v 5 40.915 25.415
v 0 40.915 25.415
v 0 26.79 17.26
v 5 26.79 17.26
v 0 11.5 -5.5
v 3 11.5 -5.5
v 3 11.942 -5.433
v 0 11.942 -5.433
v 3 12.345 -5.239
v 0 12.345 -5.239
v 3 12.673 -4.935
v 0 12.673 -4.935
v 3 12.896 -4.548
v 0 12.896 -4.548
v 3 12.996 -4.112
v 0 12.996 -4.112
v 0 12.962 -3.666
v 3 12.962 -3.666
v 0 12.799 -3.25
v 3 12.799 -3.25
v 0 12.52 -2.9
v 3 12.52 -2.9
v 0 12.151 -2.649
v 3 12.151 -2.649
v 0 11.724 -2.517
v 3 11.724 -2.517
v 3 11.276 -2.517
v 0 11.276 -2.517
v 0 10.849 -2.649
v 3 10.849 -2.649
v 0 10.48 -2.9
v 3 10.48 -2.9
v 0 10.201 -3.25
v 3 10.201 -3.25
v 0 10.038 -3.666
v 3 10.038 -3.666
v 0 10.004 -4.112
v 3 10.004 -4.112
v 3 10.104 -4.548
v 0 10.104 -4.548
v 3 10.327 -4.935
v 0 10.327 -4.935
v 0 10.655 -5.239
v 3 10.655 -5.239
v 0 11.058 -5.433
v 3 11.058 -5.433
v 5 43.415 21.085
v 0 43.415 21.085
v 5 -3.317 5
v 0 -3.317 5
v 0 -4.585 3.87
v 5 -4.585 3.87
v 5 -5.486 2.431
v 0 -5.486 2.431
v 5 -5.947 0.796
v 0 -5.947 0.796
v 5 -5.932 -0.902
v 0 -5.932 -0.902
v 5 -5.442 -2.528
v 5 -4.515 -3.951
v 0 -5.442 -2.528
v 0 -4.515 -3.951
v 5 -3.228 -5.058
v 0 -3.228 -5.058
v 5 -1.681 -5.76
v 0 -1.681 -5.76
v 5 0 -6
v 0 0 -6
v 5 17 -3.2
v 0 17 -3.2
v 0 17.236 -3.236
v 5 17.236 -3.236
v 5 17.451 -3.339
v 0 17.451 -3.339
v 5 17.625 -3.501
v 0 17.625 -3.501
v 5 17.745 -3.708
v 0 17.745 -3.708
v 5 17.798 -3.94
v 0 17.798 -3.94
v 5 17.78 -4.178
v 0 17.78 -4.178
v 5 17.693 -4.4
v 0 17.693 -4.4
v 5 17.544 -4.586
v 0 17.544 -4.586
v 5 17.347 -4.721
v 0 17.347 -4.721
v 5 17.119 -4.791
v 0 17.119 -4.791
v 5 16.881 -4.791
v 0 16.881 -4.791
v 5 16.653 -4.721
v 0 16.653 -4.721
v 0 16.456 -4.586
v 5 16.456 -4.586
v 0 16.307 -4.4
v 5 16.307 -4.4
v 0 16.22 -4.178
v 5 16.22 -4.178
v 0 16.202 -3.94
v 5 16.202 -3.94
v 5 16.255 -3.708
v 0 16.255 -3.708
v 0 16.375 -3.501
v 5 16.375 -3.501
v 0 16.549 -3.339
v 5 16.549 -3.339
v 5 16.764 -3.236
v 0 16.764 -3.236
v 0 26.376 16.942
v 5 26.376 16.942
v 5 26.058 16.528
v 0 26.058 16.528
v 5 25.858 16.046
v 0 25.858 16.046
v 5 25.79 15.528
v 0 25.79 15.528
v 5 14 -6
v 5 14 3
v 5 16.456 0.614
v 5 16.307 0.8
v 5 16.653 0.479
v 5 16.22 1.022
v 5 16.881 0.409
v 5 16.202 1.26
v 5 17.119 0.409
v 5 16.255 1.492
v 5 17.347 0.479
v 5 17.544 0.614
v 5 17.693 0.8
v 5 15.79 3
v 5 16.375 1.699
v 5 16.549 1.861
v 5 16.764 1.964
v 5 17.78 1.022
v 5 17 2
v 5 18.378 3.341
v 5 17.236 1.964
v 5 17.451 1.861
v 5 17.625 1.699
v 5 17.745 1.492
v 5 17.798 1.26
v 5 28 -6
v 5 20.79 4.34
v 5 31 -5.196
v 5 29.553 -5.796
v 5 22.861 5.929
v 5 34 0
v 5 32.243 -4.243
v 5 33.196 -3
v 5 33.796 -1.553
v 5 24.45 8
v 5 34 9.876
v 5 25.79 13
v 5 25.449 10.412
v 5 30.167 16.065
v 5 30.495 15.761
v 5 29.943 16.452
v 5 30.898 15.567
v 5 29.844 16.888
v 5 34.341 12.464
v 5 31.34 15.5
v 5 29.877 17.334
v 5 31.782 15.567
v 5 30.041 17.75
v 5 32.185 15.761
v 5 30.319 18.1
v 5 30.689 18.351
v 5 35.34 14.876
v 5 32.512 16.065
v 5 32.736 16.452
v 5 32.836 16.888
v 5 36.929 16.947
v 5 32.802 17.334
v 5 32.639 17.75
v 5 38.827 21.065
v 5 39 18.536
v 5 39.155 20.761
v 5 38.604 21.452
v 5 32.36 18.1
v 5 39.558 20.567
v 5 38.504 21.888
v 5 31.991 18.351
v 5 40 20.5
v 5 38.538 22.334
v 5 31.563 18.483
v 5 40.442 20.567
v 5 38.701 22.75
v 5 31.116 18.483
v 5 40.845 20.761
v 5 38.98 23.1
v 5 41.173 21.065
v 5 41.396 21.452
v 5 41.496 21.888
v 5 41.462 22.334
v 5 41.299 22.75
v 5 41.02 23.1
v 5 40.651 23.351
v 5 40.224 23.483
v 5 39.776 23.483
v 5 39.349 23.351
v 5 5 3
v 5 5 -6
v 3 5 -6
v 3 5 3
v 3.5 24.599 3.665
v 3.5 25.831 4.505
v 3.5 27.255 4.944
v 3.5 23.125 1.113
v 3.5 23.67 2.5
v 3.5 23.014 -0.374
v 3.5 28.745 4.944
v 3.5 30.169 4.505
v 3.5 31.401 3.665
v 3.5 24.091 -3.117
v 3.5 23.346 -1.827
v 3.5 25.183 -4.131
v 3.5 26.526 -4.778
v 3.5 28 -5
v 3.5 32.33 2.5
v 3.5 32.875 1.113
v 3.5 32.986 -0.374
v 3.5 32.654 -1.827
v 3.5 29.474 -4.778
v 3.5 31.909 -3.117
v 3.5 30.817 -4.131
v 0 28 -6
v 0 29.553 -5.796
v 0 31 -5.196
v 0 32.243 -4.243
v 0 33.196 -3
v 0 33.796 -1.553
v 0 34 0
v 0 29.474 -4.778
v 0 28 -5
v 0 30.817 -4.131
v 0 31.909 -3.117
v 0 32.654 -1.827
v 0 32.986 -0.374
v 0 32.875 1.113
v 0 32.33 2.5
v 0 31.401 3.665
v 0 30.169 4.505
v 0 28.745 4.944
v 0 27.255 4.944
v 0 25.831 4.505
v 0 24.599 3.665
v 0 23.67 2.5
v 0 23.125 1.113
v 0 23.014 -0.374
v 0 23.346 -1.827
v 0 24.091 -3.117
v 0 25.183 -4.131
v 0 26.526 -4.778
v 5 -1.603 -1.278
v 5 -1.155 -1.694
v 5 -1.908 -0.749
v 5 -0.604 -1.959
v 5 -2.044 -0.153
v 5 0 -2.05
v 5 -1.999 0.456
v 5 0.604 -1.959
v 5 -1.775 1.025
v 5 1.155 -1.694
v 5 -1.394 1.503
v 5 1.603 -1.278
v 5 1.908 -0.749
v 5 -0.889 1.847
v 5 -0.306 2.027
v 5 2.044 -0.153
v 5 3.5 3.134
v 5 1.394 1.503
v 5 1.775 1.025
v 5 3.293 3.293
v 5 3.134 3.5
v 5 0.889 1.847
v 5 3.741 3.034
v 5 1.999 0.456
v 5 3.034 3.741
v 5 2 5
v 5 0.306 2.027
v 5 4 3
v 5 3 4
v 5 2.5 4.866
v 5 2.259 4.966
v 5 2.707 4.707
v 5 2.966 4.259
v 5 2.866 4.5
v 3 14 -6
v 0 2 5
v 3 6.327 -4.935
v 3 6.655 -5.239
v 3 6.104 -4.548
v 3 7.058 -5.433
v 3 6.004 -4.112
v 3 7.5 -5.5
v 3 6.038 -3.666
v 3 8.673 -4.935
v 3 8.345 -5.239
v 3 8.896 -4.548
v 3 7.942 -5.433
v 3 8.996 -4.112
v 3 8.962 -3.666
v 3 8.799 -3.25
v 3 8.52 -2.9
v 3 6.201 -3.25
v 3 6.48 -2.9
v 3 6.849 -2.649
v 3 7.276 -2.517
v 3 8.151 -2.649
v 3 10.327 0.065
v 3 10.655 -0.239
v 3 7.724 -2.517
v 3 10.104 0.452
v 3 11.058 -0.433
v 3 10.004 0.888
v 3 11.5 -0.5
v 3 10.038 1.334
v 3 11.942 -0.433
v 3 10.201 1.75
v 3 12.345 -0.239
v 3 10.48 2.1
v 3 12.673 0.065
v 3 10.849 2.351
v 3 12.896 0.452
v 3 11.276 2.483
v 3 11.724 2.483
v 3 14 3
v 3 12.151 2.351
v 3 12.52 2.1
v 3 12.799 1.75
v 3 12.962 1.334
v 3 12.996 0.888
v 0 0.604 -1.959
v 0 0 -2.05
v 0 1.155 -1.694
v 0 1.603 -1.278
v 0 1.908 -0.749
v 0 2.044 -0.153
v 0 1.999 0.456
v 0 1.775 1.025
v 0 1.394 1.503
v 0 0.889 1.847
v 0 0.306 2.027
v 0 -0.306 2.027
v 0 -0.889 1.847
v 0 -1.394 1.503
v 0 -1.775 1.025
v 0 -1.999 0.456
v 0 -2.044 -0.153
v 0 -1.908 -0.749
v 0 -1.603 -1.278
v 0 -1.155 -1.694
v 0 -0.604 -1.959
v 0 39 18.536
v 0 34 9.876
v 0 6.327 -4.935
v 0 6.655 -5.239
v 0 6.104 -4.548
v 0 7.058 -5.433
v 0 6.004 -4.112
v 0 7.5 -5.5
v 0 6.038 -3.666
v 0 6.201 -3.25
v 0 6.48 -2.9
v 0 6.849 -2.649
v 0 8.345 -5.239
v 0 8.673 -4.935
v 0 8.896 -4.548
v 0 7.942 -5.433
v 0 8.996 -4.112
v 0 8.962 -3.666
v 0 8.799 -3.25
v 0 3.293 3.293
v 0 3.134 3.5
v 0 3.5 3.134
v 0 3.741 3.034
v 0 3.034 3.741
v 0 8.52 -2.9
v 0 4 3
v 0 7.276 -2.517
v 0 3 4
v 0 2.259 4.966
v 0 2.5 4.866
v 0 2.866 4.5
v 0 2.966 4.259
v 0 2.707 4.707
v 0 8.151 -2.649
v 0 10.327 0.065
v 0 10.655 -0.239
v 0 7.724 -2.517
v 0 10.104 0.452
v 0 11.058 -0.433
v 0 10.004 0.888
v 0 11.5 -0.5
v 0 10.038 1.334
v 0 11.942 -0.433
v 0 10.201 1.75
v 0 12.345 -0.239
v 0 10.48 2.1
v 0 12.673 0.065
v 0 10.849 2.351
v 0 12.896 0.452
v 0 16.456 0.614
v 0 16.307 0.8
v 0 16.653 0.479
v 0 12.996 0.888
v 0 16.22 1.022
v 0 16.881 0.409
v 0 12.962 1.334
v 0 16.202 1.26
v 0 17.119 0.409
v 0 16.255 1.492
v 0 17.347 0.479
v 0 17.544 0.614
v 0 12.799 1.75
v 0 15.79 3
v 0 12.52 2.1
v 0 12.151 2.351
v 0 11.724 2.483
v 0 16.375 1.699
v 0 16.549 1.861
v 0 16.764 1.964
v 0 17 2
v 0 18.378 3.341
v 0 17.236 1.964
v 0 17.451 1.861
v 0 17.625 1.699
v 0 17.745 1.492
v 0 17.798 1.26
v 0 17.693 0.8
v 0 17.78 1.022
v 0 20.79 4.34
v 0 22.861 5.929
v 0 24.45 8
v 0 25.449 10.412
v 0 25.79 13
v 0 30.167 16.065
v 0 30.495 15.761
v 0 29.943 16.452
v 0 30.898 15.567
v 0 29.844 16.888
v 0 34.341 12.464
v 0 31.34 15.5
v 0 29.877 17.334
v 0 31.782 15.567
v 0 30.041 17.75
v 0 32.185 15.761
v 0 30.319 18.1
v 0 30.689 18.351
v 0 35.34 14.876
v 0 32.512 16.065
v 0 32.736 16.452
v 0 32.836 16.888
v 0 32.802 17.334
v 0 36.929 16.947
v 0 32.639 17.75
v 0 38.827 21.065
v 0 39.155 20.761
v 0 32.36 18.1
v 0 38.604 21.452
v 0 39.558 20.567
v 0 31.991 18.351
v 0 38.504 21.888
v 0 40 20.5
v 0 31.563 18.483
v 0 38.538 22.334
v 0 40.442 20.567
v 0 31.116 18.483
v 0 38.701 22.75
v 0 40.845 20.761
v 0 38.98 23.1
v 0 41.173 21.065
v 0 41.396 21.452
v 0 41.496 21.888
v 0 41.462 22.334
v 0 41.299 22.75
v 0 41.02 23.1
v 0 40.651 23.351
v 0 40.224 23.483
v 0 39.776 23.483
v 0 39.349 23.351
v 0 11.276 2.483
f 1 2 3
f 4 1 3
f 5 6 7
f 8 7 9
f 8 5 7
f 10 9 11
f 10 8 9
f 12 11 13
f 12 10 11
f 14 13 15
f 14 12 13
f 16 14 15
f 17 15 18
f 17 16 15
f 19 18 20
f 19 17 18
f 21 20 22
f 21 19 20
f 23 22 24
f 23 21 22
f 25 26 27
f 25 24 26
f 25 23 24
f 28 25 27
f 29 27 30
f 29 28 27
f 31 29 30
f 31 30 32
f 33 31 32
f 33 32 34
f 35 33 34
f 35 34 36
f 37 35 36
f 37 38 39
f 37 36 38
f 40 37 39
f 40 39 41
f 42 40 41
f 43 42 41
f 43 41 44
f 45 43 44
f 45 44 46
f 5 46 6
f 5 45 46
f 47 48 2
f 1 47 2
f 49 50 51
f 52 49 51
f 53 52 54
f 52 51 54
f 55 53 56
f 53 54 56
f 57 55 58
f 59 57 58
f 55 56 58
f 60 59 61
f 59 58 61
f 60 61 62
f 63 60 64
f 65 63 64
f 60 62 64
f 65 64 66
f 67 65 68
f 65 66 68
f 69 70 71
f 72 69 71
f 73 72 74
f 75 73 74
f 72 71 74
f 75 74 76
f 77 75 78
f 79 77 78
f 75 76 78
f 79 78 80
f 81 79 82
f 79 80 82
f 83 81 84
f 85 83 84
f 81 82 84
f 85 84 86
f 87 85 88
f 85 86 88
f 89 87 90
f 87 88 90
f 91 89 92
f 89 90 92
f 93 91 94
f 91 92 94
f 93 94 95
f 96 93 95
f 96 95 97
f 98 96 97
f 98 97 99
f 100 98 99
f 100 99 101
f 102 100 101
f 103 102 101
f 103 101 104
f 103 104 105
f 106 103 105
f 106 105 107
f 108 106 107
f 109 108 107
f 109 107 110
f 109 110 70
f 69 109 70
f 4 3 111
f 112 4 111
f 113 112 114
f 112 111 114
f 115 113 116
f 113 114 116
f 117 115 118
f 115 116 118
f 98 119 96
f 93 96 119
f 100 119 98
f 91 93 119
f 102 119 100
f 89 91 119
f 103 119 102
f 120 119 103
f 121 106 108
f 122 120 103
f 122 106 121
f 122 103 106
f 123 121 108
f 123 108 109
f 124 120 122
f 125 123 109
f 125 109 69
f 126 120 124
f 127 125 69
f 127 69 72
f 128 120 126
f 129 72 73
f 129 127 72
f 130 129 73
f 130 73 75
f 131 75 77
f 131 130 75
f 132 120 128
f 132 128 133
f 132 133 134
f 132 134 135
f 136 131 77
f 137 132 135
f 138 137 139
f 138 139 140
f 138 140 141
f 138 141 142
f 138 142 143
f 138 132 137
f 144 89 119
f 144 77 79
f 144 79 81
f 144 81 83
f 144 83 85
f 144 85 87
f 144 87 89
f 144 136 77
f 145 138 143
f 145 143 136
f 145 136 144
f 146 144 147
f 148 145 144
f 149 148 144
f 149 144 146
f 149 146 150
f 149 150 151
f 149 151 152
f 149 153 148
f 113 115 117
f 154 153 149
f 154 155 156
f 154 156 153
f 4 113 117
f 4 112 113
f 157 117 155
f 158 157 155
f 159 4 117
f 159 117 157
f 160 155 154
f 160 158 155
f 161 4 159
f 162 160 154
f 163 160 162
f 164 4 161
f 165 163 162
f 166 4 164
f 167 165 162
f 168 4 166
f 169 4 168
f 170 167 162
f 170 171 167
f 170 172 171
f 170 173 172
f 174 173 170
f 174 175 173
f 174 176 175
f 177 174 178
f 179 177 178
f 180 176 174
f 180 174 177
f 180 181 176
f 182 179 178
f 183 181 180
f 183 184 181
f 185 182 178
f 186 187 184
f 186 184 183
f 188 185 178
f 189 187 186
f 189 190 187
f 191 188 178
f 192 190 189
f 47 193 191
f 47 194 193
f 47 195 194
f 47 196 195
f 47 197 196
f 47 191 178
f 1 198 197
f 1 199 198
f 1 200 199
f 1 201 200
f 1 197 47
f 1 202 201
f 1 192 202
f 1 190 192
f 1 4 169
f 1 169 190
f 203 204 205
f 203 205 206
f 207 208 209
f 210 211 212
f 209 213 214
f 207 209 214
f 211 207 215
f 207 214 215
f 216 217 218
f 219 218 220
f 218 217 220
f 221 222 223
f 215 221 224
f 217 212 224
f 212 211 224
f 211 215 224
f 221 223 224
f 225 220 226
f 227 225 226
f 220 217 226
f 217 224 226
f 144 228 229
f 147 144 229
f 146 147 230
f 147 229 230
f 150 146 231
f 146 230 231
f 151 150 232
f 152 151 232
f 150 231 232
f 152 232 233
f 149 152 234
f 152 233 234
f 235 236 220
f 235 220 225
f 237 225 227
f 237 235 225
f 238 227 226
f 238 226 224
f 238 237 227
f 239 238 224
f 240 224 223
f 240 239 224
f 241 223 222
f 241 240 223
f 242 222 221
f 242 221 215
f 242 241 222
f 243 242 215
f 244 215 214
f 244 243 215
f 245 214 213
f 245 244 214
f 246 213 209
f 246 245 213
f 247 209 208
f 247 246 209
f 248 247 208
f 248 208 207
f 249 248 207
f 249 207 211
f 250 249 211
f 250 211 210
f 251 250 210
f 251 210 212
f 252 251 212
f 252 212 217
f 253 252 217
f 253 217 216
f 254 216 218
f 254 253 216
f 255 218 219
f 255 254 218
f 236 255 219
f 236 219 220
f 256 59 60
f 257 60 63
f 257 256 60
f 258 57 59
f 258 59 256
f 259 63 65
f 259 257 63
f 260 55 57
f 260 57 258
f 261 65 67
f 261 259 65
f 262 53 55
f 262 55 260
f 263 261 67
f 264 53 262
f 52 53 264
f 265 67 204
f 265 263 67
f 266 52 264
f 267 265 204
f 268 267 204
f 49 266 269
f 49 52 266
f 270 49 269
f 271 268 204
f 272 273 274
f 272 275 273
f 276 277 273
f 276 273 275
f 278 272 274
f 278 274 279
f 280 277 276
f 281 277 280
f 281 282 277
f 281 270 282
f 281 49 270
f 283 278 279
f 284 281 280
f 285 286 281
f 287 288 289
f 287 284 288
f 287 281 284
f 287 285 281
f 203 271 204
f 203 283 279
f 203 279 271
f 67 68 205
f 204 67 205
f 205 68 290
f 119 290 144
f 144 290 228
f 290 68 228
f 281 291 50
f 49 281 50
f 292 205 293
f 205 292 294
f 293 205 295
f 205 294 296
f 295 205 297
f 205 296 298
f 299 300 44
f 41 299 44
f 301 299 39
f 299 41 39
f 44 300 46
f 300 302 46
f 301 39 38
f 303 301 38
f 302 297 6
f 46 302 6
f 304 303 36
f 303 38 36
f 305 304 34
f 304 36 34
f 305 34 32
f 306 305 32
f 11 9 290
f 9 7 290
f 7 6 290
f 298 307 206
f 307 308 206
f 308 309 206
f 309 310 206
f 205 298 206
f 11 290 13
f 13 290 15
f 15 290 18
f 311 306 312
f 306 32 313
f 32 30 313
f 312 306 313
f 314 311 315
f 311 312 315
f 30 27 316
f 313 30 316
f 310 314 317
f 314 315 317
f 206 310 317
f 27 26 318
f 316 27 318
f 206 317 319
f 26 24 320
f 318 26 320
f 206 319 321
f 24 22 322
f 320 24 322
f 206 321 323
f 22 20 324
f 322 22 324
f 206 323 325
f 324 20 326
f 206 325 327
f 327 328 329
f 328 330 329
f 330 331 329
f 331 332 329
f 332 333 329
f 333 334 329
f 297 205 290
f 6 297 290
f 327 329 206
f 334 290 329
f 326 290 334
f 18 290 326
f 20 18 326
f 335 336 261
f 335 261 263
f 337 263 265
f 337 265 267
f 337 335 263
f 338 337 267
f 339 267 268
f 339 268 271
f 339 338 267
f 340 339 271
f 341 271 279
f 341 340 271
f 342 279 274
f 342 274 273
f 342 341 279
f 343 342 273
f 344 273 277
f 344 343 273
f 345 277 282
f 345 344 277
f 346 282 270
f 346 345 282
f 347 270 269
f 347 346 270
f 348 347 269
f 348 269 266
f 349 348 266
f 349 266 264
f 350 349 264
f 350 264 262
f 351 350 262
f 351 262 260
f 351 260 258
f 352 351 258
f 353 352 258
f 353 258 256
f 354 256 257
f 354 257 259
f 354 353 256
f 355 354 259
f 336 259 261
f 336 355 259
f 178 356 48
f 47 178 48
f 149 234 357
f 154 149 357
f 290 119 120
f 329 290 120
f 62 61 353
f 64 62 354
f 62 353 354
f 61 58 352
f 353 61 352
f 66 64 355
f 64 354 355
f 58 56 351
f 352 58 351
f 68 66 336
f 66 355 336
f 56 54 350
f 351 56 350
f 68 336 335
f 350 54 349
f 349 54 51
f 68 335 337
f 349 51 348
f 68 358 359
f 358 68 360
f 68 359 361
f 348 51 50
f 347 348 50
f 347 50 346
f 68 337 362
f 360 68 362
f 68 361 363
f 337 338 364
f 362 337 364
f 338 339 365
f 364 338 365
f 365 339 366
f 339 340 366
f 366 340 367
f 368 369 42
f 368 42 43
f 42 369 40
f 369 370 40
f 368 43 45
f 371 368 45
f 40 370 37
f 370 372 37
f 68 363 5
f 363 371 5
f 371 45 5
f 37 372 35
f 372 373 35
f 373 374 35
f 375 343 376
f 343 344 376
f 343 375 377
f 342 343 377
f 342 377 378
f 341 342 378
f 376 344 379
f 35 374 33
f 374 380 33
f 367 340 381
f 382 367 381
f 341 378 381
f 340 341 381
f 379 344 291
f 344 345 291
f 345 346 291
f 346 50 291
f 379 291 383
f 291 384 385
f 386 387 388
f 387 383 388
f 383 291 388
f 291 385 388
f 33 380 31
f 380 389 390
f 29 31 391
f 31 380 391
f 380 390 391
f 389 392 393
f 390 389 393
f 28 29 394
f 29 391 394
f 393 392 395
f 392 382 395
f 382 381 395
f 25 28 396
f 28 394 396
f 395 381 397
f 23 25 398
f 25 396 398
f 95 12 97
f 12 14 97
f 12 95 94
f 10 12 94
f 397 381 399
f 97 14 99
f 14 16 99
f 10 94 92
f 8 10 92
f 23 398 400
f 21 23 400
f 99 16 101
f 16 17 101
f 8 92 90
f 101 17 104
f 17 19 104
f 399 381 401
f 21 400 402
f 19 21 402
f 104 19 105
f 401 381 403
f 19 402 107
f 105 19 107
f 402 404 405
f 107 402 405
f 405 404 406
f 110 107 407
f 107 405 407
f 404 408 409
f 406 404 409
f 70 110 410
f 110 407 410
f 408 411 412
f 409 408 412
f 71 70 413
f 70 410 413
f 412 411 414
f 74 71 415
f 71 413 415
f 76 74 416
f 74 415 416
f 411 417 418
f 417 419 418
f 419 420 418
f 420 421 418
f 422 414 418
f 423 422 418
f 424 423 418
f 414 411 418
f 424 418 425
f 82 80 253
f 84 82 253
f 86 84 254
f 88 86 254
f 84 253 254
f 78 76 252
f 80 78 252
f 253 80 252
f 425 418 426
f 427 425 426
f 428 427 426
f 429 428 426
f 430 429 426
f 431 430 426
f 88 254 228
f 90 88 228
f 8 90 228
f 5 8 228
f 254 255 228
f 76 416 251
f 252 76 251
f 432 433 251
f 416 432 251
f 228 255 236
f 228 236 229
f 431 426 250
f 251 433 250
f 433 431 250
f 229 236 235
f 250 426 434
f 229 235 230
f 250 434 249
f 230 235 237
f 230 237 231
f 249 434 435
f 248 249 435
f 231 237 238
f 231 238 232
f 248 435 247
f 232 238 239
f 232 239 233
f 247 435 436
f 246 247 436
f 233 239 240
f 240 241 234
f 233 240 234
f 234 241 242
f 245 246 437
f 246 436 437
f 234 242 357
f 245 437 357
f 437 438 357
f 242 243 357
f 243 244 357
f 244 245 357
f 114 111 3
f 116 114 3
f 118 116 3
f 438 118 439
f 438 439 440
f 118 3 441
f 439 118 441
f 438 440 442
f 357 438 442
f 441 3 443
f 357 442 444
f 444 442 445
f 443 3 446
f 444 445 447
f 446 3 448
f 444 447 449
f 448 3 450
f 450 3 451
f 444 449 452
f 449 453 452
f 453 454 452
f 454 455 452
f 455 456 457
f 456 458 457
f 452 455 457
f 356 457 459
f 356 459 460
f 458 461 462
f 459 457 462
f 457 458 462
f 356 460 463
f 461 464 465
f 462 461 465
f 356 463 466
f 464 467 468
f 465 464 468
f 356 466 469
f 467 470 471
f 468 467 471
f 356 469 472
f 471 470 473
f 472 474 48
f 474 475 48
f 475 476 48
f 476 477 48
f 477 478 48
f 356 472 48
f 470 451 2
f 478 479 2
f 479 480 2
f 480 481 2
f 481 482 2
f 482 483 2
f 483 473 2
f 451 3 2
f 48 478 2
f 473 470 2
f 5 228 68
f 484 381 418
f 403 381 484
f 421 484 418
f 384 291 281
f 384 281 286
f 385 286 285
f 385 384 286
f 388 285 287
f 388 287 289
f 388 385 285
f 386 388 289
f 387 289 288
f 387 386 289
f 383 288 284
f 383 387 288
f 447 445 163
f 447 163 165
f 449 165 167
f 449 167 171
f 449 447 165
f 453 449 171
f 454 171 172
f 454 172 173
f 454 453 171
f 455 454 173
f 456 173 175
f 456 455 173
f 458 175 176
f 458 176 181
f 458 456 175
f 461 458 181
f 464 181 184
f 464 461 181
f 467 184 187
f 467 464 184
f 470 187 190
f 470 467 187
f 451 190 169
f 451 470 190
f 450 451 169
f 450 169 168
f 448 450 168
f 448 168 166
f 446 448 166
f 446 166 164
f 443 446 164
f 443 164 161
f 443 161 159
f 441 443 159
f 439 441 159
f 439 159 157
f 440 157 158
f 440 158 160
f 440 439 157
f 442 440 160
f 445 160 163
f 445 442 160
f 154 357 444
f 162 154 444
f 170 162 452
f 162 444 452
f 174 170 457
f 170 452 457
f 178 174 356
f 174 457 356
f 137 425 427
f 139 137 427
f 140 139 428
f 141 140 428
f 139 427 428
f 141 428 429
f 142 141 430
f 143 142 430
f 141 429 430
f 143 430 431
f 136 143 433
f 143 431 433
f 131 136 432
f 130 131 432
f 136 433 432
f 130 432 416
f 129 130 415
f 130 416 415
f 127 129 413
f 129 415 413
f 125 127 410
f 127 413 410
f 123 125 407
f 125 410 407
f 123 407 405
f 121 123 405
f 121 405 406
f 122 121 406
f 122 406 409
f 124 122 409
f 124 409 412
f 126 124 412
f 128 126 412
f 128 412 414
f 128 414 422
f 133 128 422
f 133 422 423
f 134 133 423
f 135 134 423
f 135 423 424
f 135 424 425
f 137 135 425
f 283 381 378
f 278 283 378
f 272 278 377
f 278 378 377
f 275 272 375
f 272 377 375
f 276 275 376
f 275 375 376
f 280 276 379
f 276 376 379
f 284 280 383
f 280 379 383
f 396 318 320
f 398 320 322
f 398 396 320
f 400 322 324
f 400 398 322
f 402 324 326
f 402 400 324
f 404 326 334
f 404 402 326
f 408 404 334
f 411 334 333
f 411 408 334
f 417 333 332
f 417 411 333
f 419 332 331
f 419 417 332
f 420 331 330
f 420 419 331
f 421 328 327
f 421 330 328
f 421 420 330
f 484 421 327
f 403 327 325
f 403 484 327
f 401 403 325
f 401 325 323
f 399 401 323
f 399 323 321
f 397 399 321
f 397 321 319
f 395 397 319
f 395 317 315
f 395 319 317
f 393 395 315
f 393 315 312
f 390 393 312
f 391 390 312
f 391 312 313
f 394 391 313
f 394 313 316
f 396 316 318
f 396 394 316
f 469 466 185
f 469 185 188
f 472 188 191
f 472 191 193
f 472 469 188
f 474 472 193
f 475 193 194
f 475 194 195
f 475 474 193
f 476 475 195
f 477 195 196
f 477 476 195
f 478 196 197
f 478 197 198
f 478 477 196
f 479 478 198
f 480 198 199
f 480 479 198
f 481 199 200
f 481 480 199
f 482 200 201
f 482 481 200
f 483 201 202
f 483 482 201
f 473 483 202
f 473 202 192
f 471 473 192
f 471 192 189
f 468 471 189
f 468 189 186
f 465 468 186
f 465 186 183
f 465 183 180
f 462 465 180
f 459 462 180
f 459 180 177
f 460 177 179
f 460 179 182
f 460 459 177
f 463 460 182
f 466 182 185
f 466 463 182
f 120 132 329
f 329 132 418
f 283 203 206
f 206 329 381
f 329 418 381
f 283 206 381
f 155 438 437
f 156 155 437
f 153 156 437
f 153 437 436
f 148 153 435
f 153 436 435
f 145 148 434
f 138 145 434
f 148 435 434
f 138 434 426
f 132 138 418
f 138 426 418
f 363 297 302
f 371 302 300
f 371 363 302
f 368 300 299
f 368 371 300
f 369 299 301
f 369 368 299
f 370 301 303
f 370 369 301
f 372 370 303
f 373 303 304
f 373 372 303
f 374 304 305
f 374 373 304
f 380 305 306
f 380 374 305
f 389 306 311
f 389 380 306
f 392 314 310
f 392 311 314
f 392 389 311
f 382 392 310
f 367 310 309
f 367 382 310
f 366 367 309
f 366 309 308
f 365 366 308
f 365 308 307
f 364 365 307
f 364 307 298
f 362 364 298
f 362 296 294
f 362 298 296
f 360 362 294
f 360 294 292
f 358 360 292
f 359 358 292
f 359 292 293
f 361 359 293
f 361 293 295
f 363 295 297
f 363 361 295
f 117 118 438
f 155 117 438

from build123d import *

# Parameters (mm, degrees)
SKETCH1_R                   = 2.05
SKETCH1_R_2                 = 1.5
BOSS_EXTRUDE1_DEPTH         = 5
FILLET1_START               = -1
FILLET1_DEPTH               = 7
FILLET1_2_DEPTH             = 5
TAP_DRILL_FOR_M2X0_4_TAP1_D = 1.6
SKETCH4_W                   = 9
SKETCH4_H                   = 9
CUT_EXTRUDE1_DEPTH          = 2
SKETCH5_R                   = 5
CUT_EXTRUDE2_DEPTH          = 3.5


with BuildPart() as part:
    # Sketch1 → Boss-Extrude1 (new body)
    with BuildSketch(Plane(origin=(0, 0, 0), x_dir=(0, 0, -1), z_dir=(1, 0, 0))):
        with BuildLine():
            Line((6, 0), (6, 28))
            ThreePointArc((6, 28), (4.242640687, 32.242640687), (0, 34))
            Line((0, 34), (-9.875644347, 34))
            ThreePointArc((-9.875644347, 34), (-14.875644347, 35.339745962), (-18.535898385, 39))
            Line((-18.535898385, 39), (-21.084936491, 43.415063509))
            Line((-21.084936491, 43.415063509), (-25.415063509, 40.915063509))
            Line((-25.415063509, 40.915063509), (-17.260063509, 26.790189174))
            ThreePointArc((-17.260063509, 26.790189174), (-16.528012702, 26.058138366), (-15.528012702, 25.790189174))
            Line((-15.528012702, 25.790189174), (-13, 25.790189174))
            ThreePointArc((-13, 25.790189174), (-5.928932188, 22.861256986), (-3, 15.790189174))
            Line((-3, 15.790189174), (-3, 3))
            Line((-3, 3), (-5, 3))
            Line((-5, 3), (-5, -3.31662479))
            ThreePointArc((-5, -3.31662479), (1.732050808, -5.744562647), (6, 0))
        make_face()
        Circle(SKETCH1_R, mode=Mode.SUBTRACT)
        with Locations((-22, 40)):
            Circle(SKETCH1_R_2, mode=Mode.SUBTRACT)
        with Locations((-17, 31.339745962)):
            Circle(SKETCH1_R_2, mode=Mode.SUBTRACT)
        with Locations((-1, 11.5)):
            Circle(SKETCH1_R_2, mode=Mode.SUBTRACT)
        with Locations((4, 11.5)):
            Circle(SKETCH1_R_2, mode=Mode.SUBTRACT)
        with Locations((4, 7.5)):
            Circle(SKETCH1_R_2, mode=Mode.SUBTRACT)
    extrude(amount=BOSS_EXTRUDE1_DEPTH)

    # Fillet1: read off the stored shape, not the designer's step
    # Fillet1 outline → Fillet1 (cut)
    with BuildSketch(Plane.YZ.offset(FILLET1_START)):
        with BuildLine():
            ThreePointArc((2, 5), (2.707106781, 4.707106781), (3, 4))
            Line((3, 4), (3, 5))
            Line((3, 5), (2, 5))
        make_face()
    extrude(amount=FILLET1_DEPTH, mode=Mode.SUBTRACT)

    # Fillet1 2 outline → Fillet1 2 (add)
    with BuildSketch(Plane.YZ):
        with BuildLine():
            ThreePointArc((4, 3), (3.292893219, 3.292893219), (3, 4))
            Line((3, 4), (3, 3))
            Line((3, 3), (4, 3))
        make_face()
    extrude(amount=FILLET1_2_DEPTH)

    # Tap Drill for M2x0.4 Tap1 (through all)
    with Locations(Plane(origin=(5, 0, 0), x_dir=(0, 0, -1), z_dir=(1, 0, 0))):
        with Locations((-1.2, 17), (4, 17)):
            Hole(TAP_DRILL_FOR_M2X0_4_TAP1_D / 2)

    # Sketch4 → Cut-Extrude1 (cut)
    with BuildSketch(Plane.ZY.offset(-5)):
        with Locations((-1.5, 9.5)):
            Rectangle(SKETCH4_W, SKETCH4_H)
    extrude(amount=CUT_EXTRUDE1_DEPTH, mode=Mode.SUBTRACT)

    # Sketch5 → Cut-Extrude2 (cut)
    with BuildSketch(Plane(origin=(0, 0, 0), x_dir=(0, 0, -1), z_dir=(1, 0, 0))):
        with Locations((0, 28)):
            Circle(SKETCH5_R)
    extrude(amount=CUT_EXTRUDE2_DEPTH, mode=Mode.SUBTRACT)


solid = part.part
